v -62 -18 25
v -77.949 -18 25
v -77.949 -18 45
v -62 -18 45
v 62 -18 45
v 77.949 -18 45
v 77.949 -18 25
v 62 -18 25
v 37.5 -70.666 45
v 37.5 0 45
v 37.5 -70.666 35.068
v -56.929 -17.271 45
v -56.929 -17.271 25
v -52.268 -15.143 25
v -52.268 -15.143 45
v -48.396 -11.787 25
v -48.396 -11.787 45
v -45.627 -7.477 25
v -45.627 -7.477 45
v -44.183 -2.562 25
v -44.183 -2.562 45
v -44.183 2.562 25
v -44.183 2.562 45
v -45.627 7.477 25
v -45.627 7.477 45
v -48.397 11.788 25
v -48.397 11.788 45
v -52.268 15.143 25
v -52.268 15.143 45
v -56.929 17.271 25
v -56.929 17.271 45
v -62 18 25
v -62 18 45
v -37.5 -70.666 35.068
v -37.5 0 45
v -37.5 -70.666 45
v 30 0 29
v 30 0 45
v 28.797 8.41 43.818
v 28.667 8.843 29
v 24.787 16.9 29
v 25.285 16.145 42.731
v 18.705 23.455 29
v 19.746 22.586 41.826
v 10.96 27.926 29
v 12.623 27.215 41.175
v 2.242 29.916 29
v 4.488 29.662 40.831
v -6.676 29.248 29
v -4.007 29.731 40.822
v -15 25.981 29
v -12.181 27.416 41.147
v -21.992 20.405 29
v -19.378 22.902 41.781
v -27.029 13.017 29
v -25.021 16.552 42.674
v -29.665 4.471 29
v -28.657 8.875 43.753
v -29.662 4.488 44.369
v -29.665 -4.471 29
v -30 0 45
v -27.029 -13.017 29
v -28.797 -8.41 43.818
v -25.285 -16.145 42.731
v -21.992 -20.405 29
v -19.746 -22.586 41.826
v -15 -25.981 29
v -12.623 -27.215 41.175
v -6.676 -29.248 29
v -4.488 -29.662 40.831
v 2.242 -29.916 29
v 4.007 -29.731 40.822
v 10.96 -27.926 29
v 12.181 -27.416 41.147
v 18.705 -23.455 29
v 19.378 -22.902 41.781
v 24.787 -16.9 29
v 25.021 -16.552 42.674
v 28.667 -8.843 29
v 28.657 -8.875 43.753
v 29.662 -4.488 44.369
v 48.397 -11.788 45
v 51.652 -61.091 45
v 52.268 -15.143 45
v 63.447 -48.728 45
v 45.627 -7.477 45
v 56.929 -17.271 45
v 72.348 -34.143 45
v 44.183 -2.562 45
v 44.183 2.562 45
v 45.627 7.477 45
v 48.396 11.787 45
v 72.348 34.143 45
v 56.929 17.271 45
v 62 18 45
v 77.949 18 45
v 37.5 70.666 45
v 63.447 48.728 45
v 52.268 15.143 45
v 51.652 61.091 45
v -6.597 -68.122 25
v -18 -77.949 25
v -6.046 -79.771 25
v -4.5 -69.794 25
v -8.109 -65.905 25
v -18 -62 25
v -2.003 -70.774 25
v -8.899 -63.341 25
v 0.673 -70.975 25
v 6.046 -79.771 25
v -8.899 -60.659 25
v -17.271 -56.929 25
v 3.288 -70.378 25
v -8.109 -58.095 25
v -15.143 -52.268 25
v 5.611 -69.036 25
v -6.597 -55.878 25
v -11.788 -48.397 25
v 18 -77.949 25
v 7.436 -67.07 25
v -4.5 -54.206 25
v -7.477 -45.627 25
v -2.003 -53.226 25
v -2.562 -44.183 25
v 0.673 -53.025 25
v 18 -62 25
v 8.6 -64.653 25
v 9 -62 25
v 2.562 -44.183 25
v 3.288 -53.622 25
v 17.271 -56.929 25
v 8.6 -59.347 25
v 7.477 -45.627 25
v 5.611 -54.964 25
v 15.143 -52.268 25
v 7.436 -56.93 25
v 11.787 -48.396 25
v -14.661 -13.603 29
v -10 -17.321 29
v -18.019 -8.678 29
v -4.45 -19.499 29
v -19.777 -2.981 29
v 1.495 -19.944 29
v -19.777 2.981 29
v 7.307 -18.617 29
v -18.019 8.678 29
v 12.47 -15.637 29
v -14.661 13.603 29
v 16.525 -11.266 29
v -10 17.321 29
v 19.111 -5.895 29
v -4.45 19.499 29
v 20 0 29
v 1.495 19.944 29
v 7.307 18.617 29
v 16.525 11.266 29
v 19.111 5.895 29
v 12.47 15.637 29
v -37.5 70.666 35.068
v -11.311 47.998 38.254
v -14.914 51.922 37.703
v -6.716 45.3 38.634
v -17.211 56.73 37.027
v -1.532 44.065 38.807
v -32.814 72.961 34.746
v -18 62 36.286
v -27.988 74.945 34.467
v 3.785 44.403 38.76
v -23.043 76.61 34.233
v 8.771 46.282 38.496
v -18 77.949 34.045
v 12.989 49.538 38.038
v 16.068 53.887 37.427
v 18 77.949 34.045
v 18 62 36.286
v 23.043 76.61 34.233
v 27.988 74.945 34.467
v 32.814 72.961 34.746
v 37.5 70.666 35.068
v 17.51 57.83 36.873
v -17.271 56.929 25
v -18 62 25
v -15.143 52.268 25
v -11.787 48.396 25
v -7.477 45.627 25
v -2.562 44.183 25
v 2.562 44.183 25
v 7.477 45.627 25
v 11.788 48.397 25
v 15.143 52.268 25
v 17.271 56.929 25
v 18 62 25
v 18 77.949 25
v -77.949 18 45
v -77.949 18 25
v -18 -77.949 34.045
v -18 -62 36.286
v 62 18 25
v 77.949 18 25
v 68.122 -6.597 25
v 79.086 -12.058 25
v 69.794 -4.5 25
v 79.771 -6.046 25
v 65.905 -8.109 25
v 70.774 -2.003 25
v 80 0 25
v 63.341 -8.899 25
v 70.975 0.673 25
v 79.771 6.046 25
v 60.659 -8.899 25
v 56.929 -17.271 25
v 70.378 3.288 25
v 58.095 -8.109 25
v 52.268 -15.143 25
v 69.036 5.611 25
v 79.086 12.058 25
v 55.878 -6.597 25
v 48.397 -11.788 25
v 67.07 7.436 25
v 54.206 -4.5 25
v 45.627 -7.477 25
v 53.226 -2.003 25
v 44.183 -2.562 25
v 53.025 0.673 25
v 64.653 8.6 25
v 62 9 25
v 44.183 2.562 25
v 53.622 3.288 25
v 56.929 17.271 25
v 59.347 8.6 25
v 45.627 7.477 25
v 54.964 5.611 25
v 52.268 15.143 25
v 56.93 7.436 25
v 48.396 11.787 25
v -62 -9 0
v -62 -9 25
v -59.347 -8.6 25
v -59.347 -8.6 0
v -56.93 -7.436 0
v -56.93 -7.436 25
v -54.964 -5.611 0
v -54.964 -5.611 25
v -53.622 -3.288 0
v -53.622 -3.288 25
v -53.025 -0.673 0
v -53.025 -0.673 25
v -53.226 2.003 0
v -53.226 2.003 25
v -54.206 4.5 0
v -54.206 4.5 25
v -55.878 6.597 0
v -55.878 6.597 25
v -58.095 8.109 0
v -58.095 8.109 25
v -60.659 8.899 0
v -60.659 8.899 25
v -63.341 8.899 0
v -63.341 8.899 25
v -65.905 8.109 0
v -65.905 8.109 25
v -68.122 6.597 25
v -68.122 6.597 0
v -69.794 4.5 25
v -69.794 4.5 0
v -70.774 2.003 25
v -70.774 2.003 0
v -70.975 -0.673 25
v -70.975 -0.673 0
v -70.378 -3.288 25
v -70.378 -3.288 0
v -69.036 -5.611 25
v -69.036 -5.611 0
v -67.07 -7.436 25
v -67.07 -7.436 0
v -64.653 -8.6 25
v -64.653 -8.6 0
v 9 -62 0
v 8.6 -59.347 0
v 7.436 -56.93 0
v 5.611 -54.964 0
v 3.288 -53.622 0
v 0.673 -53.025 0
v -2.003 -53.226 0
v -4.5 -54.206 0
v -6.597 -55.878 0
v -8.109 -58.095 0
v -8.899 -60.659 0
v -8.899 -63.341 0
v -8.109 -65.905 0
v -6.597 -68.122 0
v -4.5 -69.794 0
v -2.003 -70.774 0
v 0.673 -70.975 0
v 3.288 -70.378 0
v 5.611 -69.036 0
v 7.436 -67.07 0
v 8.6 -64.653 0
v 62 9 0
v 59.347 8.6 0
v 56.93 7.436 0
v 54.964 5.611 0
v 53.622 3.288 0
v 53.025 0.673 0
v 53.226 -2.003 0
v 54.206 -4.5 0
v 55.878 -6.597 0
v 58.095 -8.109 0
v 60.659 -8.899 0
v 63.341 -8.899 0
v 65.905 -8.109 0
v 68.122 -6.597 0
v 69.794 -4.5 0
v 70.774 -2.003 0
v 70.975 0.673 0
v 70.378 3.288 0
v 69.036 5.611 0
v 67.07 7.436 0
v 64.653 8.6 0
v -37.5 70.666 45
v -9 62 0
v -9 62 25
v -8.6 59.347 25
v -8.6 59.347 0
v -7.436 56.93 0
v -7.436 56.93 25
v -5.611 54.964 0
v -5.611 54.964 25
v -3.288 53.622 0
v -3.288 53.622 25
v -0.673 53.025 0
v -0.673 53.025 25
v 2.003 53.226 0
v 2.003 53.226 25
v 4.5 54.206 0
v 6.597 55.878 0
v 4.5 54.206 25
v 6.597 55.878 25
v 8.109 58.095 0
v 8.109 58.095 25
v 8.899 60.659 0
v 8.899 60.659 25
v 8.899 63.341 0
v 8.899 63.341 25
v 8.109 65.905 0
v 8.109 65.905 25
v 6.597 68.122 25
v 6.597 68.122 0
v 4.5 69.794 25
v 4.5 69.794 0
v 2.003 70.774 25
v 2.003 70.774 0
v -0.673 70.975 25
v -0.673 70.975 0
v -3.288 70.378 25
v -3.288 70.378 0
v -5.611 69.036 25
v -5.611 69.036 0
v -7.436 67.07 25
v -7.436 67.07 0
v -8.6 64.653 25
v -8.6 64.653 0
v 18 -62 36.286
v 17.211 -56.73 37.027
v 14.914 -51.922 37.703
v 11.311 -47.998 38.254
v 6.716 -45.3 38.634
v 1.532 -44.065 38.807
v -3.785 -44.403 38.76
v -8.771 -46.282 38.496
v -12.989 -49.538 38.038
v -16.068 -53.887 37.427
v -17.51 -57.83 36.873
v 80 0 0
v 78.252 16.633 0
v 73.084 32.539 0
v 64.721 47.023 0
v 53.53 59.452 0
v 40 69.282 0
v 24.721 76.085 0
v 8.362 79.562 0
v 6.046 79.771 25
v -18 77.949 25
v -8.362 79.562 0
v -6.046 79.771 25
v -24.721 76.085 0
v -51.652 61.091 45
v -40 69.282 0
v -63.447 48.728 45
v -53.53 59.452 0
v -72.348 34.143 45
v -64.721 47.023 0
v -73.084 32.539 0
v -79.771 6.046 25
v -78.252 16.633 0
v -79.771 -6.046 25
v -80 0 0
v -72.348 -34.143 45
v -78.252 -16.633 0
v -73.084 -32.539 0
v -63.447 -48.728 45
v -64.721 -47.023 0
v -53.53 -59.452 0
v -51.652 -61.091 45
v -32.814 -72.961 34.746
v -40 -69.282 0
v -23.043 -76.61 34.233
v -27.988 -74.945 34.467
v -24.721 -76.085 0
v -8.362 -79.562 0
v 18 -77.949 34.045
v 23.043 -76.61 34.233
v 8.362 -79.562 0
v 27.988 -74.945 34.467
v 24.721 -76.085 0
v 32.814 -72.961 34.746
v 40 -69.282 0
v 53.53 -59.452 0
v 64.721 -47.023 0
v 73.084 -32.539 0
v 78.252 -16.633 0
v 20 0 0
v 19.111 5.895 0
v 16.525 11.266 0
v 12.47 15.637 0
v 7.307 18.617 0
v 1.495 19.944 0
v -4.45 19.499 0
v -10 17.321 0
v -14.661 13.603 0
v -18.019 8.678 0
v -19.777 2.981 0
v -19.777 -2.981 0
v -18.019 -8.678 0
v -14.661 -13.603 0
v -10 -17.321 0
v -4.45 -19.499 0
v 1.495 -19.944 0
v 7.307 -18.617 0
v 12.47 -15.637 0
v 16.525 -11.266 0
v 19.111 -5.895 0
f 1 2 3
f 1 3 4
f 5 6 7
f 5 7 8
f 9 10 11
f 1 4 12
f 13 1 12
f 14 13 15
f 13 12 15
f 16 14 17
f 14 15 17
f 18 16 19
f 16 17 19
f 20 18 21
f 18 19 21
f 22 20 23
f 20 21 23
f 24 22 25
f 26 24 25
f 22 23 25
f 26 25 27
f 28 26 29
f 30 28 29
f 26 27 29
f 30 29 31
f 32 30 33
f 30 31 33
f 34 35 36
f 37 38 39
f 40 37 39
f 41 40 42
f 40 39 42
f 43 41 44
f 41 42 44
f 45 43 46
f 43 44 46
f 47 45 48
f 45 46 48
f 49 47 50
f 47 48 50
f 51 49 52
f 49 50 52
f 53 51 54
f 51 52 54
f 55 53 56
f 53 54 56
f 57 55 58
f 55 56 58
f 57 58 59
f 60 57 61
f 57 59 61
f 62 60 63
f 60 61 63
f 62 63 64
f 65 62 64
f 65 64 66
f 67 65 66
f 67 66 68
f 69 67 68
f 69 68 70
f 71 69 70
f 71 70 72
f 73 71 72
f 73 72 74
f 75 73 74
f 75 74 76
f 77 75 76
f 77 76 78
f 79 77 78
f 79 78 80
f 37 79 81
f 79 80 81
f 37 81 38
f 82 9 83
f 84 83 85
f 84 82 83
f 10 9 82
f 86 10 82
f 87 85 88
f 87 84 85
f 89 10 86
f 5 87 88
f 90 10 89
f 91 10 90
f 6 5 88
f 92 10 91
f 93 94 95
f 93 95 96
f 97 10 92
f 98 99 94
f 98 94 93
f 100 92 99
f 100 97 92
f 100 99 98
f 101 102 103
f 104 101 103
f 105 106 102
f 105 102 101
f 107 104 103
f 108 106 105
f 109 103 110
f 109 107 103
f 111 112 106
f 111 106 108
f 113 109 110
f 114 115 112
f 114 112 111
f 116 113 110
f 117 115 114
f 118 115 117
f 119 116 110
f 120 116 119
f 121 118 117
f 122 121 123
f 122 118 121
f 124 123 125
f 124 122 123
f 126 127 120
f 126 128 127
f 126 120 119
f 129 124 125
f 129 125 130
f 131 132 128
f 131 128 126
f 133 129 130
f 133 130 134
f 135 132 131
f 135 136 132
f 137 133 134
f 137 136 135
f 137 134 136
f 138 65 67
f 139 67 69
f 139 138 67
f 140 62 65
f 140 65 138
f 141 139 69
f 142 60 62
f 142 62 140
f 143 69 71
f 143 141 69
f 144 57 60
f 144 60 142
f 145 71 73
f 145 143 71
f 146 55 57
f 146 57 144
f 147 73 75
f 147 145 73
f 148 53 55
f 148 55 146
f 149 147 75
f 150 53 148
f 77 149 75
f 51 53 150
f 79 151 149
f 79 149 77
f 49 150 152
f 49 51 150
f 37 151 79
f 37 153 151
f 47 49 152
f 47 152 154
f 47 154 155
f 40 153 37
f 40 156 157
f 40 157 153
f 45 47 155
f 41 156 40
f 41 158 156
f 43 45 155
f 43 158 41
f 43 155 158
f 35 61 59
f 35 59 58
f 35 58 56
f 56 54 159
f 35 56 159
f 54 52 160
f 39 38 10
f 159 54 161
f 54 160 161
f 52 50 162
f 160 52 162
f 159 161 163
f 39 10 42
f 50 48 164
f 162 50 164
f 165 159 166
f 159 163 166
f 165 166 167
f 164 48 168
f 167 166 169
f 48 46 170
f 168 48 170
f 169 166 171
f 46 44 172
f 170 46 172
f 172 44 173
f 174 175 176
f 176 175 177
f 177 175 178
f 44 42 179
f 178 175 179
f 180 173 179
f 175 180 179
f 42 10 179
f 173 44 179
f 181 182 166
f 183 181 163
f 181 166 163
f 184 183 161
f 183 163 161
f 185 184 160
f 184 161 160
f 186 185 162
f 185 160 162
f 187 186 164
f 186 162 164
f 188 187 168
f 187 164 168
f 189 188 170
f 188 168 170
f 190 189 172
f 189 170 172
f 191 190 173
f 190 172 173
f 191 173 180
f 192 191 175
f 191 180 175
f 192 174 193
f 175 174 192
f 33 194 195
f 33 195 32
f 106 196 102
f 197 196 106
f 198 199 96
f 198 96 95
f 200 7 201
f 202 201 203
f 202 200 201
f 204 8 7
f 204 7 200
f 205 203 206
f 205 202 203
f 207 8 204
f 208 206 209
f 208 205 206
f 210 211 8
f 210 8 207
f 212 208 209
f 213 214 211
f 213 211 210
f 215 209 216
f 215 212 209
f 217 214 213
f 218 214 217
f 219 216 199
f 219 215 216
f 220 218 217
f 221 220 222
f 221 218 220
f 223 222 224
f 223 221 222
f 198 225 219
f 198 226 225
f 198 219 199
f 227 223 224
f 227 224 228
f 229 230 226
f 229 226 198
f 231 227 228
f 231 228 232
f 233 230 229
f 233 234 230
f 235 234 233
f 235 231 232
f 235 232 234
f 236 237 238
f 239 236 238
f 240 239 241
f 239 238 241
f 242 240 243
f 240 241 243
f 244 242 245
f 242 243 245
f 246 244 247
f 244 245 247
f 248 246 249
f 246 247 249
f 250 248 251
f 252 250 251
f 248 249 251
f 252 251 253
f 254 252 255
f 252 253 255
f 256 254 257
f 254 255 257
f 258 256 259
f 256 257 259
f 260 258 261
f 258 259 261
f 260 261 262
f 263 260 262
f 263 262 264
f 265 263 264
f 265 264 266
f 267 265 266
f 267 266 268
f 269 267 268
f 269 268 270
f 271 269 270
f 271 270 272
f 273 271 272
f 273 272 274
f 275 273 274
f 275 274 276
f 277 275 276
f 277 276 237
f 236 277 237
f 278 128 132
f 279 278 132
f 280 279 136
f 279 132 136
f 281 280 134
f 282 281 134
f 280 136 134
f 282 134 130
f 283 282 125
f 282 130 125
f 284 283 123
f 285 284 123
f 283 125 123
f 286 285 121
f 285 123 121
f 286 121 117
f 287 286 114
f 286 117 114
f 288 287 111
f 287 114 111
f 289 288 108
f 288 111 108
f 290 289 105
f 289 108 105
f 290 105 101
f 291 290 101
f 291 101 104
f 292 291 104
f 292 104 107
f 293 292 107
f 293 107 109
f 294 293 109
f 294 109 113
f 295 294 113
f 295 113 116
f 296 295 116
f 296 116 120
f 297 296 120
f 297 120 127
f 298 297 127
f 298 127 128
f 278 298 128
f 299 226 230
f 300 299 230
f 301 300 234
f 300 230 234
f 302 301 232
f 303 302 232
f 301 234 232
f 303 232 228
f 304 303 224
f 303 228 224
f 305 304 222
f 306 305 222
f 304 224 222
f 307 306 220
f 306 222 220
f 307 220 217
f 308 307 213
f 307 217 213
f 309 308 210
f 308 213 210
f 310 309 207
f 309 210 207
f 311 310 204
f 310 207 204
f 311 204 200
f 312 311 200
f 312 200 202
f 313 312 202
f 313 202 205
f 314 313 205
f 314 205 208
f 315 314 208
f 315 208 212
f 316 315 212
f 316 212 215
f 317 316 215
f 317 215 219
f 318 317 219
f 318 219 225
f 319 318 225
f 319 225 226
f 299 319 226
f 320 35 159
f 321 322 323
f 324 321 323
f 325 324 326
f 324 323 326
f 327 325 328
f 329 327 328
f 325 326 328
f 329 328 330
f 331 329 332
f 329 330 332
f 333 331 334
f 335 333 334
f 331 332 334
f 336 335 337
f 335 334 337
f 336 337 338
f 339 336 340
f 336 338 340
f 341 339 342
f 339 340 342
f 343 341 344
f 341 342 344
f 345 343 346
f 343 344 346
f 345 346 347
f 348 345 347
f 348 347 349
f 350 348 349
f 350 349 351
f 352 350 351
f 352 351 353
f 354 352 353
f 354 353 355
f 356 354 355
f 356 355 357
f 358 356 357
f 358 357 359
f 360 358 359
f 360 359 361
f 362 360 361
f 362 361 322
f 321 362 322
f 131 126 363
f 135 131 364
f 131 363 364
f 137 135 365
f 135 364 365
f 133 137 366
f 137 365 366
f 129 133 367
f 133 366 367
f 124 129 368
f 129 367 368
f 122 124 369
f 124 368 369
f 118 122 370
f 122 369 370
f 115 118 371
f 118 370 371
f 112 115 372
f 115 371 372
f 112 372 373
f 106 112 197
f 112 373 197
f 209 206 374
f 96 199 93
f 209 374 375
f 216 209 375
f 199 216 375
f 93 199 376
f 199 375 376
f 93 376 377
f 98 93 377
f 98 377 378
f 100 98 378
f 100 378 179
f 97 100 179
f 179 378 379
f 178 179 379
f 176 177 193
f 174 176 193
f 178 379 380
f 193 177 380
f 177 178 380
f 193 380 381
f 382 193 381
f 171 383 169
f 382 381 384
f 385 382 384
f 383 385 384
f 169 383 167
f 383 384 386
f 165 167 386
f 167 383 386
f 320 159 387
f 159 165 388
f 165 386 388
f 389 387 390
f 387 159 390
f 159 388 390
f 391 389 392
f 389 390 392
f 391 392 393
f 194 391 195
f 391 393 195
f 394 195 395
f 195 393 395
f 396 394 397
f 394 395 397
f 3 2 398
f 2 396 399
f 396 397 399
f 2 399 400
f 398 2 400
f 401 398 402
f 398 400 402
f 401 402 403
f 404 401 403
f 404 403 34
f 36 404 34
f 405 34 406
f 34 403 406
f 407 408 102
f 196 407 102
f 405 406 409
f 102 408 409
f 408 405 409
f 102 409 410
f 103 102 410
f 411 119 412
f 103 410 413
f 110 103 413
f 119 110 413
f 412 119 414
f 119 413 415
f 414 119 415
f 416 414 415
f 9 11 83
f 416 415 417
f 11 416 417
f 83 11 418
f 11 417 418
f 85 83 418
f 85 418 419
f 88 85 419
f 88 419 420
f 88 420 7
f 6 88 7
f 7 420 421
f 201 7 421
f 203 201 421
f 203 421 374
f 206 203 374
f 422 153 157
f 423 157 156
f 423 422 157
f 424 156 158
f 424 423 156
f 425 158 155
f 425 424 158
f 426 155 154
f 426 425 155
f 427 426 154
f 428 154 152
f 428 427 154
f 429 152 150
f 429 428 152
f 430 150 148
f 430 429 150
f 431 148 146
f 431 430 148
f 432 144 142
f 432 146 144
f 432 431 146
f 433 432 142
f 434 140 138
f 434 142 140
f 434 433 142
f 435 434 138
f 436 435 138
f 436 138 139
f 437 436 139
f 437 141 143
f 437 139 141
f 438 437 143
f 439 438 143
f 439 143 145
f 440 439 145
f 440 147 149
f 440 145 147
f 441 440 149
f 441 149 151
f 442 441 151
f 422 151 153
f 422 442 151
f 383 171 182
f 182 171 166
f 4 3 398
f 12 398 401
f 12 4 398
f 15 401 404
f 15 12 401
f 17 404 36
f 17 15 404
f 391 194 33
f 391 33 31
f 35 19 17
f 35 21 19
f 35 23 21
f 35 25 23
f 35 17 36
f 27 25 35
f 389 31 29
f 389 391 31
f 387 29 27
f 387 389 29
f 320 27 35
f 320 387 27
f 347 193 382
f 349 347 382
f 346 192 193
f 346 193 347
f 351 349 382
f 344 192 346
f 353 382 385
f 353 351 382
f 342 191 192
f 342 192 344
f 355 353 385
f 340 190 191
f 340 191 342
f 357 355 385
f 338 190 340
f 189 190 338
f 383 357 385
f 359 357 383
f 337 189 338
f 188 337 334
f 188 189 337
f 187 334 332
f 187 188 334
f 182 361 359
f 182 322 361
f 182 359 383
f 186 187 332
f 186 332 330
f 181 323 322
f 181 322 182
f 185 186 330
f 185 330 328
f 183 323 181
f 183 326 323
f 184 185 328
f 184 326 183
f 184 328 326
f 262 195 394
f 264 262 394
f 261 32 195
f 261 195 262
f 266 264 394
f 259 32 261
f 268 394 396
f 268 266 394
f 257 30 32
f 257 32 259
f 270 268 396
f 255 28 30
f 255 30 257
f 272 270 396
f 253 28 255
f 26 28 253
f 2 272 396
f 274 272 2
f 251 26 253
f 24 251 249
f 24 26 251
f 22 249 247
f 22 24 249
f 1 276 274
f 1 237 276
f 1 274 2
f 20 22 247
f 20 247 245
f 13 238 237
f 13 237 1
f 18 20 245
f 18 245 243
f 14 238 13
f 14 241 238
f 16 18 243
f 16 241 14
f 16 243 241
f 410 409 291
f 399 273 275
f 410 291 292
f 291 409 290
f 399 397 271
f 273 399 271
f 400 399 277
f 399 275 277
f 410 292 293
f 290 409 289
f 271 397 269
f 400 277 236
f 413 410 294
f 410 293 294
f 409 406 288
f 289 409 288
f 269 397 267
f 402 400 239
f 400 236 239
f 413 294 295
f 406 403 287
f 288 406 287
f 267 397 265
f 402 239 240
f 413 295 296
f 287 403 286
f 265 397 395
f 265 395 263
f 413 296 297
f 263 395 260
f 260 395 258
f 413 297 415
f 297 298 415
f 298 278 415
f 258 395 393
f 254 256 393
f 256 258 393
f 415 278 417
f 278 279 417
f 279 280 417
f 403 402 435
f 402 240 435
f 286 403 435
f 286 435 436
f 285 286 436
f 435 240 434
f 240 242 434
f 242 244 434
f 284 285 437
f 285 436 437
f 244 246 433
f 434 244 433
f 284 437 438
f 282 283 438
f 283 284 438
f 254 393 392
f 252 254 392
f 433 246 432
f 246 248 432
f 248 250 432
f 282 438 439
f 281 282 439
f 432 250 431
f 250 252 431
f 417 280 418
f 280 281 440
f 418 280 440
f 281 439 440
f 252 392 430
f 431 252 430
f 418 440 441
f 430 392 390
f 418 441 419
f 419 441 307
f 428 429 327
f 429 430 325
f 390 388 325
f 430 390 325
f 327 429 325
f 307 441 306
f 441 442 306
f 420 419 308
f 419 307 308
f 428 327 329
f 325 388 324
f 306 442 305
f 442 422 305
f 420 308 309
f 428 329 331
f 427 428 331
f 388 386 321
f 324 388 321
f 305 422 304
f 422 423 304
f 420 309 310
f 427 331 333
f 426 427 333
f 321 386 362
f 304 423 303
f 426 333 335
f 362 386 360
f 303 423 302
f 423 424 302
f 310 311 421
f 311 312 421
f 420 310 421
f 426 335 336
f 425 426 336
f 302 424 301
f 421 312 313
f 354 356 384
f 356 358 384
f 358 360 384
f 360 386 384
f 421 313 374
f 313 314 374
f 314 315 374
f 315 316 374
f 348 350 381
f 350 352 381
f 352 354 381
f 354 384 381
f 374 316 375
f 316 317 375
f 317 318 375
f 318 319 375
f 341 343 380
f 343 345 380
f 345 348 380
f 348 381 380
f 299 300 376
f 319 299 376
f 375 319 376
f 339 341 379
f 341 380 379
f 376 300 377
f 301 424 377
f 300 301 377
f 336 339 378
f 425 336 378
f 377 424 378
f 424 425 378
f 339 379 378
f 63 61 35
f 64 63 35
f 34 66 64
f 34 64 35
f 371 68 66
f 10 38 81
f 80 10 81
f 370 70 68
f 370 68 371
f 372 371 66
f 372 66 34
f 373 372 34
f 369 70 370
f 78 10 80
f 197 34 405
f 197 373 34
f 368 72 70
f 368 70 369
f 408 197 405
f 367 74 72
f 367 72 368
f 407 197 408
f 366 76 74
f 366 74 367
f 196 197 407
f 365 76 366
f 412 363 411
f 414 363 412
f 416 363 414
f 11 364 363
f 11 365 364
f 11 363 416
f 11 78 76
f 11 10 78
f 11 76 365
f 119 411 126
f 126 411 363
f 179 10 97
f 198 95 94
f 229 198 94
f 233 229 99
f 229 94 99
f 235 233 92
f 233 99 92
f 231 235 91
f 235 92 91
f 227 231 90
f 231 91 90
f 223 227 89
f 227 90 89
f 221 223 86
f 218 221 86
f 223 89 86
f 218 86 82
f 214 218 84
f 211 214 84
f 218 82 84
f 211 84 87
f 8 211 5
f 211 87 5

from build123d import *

# Parameters (mm, degrees)
PAD001_DEPTH          = 37.5
SKETCH_R              = 80
SKETCH_R_2            = 20
PAD_DEPTH             = 45
SKETCH001_R           = 30
POCKET_DEPTH          = 16
POCKET001_DEPTH       = 20
POLARPATTERN_COUNT    = 4
SKETCH003_R           = 9
POCKET002_DEPTH       = 486.41188
POLARPATTERN001_COUNT = 4


with BuildPart() as pad001:
    # Sketch004 → Pad001 (new body, symmetric)
    with BuildSketch(Plane.YZ):
        Polygon((0, 45), (-85, 33.054029), (-85, 45), align=None)
    extrude(amount=PAD001_DEPTH, both=True)


with BuildPart() as part_mirroring:
    # Part__Mirroring: instance of Pad001
    add(pad001.part.mirror(Plane(origin=(0, 0, 0), x_dir=(1, 0, 0), z_dir=(0, 1, 0))))


with BuildPart() as cut001:
    # Sketch → Pad (new body)
    with BuildSketch(Plane.XY):
        Circle(SKETCH_R)
        Circle(SKETCH_R_2, mode=Mode.SUBTRACT)
    extrude(amount=PAD_DEPTH)

    # Sketch001 → Pocket (cut)
    with BuildSketch(Plane.XY.offset(45)):
        Circle(SKETCH001_R)
    extrude(amount=-POCKET_DEPTH, mode=Mode.SUBTRACT)

    # Sketch002 → Pocket001 (cut)
    with BuildSketch(Plane.XY.offset(45)):
        with BuildLine():
            ThreePointArc((-18, -77.948701), (0, -80), (18, -77.948701))
            Line((18, -77.948701), (18, -62))
            ThreePointArc((18, -62), (-2.4e-05, -44), (-18, -62.000049))
            Line((-18, -77.948701), (-18, -62.000049))
        make_face()
    pocket001 = extrude(amount=-POCKET001_DEPTH, mode=Mode.SUBTRACT)

    # PolarPattern: Pocket001 ×4 about axis
    polarpattern_axis = Axis((0, 0, 45), (0, 0, 1))
    for i in range(1, POLARPATTERN_COUNT):
        add(pocket001.rotate(polarpattern_axis, i * 360 / POLARPATTERN_COUNT), mode=Mode.SUBTRACT)

    # Sketch003 → Pocket002 (cut, through all)
    with BuildSketch(Plane.XY.offset(25)):
        with Locations((0, -62)):
            Circle(SKETCH003_R)
    pocket002 = extrude(amount=-POCKET002_DEPTH, mode=Mode.SUBTRACT)

    # PolarPattern001: Pocket002 ×4 about axis
    polarpattern001_axis = Axis((0, 0, 25), (0, 0, 1))
    for i in range(1, POLARPATTERN001_COUNT):
        add(pocket002.rotate(polarpattern001_axis, i * 360 / POLARPATTERN001_COUNT), mode=Mode.SUBTRACT)

    # Cut: cut Part__Mirroring
    add(part_mirroring.part, mode=Mode.SUBTRACT)

    # Cut001: cut Pad001
    add(pad001.part, mode=Mode.SUBTRACT)


solid = cut001.part
